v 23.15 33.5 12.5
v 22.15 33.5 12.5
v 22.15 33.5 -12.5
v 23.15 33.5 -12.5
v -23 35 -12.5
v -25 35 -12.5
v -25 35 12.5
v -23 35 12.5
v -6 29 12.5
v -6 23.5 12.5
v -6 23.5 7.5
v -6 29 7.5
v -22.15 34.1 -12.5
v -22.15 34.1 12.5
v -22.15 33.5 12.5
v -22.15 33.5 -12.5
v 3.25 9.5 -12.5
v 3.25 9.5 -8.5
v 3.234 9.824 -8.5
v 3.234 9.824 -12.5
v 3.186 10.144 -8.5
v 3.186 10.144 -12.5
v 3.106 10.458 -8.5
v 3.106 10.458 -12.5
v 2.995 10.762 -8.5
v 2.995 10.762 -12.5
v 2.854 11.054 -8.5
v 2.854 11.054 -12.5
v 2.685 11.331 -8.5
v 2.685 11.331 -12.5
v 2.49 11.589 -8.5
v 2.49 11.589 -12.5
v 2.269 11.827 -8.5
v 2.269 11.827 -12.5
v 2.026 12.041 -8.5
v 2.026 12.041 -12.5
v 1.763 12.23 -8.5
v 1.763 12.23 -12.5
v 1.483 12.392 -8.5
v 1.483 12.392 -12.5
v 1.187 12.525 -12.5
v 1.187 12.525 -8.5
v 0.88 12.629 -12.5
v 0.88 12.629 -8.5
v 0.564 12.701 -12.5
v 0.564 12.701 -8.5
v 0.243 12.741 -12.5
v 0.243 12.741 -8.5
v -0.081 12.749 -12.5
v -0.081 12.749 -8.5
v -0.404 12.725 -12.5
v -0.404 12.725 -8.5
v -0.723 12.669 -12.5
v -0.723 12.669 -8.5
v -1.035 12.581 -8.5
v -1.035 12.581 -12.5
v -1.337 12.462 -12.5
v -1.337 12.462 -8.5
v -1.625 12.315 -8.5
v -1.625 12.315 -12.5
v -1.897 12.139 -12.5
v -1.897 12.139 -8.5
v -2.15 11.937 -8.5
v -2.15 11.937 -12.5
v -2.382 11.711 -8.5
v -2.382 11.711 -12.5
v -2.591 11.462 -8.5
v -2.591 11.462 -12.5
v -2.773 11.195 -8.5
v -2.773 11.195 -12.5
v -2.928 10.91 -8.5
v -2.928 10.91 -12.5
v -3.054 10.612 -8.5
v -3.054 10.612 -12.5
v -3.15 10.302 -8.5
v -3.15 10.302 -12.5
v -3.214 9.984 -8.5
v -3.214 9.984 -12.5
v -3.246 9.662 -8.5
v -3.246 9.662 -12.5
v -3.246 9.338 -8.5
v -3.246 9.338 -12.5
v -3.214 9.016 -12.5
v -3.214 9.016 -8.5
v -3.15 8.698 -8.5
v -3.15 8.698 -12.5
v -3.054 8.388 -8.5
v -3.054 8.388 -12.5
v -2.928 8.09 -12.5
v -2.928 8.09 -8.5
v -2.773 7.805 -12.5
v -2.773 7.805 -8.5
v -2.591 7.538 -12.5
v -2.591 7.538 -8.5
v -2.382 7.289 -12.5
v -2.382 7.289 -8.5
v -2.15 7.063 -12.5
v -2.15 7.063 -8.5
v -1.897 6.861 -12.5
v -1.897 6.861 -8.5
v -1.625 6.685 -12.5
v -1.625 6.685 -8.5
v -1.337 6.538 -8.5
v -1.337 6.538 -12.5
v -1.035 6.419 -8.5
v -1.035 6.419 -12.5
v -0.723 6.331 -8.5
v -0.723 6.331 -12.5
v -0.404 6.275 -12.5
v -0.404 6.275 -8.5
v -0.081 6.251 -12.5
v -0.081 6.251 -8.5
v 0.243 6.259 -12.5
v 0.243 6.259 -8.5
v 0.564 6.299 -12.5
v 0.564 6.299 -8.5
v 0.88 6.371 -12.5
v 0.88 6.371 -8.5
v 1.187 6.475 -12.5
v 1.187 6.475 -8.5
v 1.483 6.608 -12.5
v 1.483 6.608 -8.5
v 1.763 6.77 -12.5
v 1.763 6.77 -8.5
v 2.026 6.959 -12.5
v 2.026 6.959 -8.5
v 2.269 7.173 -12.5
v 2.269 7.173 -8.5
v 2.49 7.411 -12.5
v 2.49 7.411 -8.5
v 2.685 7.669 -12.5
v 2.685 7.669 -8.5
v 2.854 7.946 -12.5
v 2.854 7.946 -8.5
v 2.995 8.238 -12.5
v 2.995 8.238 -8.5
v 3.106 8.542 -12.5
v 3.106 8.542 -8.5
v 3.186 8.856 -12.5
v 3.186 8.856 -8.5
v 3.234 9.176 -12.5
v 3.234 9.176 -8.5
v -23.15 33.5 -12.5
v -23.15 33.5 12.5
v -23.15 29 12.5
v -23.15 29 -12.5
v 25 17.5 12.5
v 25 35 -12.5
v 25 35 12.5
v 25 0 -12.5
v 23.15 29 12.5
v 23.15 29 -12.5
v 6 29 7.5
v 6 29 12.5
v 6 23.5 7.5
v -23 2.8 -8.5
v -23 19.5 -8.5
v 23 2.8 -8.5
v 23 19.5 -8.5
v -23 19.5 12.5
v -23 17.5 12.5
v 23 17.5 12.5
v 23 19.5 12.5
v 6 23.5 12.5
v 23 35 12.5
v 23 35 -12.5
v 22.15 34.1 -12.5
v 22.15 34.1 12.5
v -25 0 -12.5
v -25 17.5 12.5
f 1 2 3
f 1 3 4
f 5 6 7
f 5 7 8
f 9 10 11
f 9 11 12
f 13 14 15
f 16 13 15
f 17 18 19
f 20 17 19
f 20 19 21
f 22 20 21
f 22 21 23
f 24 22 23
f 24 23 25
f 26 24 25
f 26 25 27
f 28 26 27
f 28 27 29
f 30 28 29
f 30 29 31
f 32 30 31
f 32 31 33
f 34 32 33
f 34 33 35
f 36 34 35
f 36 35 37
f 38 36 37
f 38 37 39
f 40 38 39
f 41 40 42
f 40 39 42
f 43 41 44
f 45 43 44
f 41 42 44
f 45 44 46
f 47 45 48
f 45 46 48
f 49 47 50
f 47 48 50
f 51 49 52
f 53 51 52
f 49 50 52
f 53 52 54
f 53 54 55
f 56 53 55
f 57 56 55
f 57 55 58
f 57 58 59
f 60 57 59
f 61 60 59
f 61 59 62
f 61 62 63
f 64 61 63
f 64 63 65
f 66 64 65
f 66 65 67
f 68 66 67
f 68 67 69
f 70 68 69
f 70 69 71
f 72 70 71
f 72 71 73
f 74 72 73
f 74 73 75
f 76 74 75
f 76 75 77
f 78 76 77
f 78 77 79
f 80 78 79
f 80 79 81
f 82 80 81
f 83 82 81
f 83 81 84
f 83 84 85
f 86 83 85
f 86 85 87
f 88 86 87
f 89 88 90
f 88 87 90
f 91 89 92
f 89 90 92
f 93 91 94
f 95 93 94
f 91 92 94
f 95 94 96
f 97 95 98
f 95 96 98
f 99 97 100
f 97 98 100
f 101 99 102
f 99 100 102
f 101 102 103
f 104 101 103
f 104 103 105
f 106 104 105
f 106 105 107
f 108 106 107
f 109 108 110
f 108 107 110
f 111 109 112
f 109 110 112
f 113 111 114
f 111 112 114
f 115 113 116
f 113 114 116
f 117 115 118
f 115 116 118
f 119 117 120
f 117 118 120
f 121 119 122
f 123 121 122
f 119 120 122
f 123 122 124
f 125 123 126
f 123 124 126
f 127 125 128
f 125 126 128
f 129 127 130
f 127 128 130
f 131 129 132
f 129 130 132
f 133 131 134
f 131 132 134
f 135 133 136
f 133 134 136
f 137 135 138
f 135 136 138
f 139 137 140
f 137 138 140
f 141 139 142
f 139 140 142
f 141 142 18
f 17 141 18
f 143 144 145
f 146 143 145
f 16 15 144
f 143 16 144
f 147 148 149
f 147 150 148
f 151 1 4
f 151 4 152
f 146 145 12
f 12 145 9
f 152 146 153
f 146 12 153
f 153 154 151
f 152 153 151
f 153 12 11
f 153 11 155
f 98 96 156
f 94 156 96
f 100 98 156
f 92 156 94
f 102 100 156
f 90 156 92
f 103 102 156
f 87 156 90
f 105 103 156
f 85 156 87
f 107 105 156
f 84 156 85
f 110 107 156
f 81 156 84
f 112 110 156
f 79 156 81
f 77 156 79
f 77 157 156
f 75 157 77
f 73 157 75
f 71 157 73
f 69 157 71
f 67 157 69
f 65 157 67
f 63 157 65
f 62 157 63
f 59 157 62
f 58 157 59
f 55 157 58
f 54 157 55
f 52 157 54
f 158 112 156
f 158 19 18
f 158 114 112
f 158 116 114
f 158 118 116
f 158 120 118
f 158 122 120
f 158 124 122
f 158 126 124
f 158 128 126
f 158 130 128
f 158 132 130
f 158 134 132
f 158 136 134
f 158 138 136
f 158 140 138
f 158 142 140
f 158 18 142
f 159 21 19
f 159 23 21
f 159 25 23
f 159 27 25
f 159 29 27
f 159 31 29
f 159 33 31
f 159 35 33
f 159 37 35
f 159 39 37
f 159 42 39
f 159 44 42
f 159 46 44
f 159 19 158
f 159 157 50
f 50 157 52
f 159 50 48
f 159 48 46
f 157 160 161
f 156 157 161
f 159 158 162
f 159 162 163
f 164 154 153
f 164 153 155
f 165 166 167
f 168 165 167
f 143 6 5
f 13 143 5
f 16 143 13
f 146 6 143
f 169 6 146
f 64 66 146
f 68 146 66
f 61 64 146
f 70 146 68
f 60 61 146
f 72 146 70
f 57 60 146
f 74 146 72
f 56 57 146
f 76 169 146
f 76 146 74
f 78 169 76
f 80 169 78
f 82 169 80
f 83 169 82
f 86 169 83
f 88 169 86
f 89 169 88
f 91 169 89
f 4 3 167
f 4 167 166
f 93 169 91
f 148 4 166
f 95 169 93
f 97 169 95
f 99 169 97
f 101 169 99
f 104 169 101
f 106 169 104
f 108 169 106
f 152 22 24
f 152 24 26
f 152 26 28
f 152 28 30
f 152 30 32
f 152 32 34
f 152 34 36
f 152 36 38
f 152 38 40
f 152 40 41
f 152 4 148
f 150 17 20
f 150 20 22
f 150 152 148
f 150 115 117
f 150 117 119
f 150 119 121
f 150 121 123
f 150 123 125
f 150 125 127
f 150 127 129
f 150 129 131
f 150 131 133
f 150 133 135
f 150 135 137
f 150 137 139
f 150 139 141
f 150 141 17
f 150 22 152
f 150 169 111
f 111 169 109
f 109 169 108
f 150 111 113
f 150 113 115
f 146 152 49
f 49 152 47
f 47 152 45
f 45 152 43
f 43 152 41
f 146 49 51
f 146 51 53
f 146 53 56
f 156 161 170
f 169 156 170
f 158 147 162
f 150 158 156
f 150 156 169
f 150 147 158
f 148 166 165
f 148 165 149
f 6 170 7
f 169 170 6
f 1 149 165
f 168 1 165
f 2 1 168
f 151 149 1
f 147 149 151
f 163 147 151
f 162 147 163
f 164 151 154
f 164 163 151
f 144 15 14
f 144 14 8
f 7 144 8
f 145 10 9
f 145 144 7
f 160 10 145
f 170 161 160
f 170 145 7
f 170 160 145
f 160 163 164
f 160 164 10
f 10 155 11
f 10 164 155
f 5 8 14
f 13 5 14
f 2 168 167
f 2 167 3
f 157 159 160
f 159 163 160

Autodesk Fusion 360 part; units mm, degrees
sketch "Sketch1" plane through (0, 0, 0) normal (0, 1, 0) x (1, 0, 0)
  line L0 (25, -12.5) -> (-25, -12.5)
  line L1 (-25, -12.5) -> (-25, 12.5)
  line L2 (-25, 12.5) -> (25, 12.5)
  line L3 (25, 12.5) -> (25, -12.5)
  line L4 (25, -12.5) -> (-25, 12.5) construction
  line L5 (-25, -12.5) -> (25, 12.5) construction
  dimension "d1" = 25
  dimension "d2" = 50
extrude "Extrude1" add sketch "Sketch1" along normal blind 35
sketch "Sketch2" plane through (0, 0, 12.5) normal (0, 0, 1) x (1, 0, 0)
  line L0 (-25, 0) -> (25, 0)
  line L1 (25, 0) -> (25, 35)
  line L2 (25, 35) -> (-25, 35)
  line L3 (-25, 35) -> (-25, 0)
  line L4 (0, 0) -> (0, 11) construction
  line L5 (23, 35) -> (22.15, 34.1)
  line L6 (22.15, 34.1) -> (22.15, 33.5)
  line L7 (22.15, 33.5) -> (23.15, 33.5)
  line L8 (23.15, 33.5) -> (23.15, 29)
  line L9 (23.15, 29) -> (0, 29)
  line L10 (23, 35) -> (0, 35)
  line L11 (-25, 35) -> (25, 35)
  line L12 (-23.15, 33.5) -> (-23.15, 29)
  line L13 (-25, 0) -> (-25, 35)
  line L14 (-23, 35) -> (0, 35)
  line L15 (-22.15, 33.5) -> (-23.15, 33.5)
  line L16 (-22.15, 34.1) -> (-22.15, 33.5)
  line L17 (-23.15, 29) -> (0, 29)
  line L18 (-23, 35) -> (-22.15, 34.1)
  dimension "d5" = 46.3
  dimension "d6" = 1
  dimension "d7" = 1.5
  dimension "d8" = 0.6
  dimension "d9" = 2
  dimension "d10" = 4.5
extrude "Extrude2" cut sketch "Sketch2" against normal through all contours L2 L5 L6 L7 L8 L9 L10 L11 L12 L14 L15 L16 L17 L18
sketch "Sketch3" plane through (0, 0, 12.5) normal (0, 0, 1) x (1, 0, 0)
  line L0 (23, 35) -> (22.15, 34.1)
  line L1 (22.15, 34.1) -> (22.15, 33.5)
  line L2 (22.15, 33.5) -> (23.15, 33.5)
  line L3 (23.15, 33.5) -> (23.15, 29)
  line L4 (23.15, 29) -> (-23.15, 29)
  line L5 (-23.15, 29) -> (-23.15, 33.5)
  line L6 (-23.15, 33.5) -> (-22.15, 33.5)
  line L7 (-22.15, 33.5) -> (-22.15, 34.1)
  line L8 (-22.15, 34.1) -> (-23, 35)
  line L9 (-23, 35) -> (-25, 35)
  line L10 (-25, 35) -> (-25, 0)
  line L11 (-25, 0) -> (25, 0)
  line L12 (25, 0) -> (25, 35)
  line L13 (25, 35) -> (23, 35)
  line L14 (6, 23.5) -> (-6, 23.5)
  line L15 (-6, 23.5) -> (-6, 34.5)
  line L16 (-6, 34.5) -> (6, 34.5)
  line L17 (6, 34.5) -> (6, 23.5)
  line L18 (6, 23.5) -> (-6, 34.5) construction
  line L19 (-6, 23.5) -> (6, 34.5) construction
  point P0 (0, 29)
  dimension "d12" = 12
  dimension "d13" = 11
extrude "Extrude3" cut sketch "Sketch3" against normal blind 5 contours L4 L14 L15 L17
sketch "Sketch4" plane through (25, 0, 0) normal (1, 0, 0) x (0, 0, -1)
  line L0 (-12.5, 0) -> (12.5, 0)
  line L1 (12.5, 0) -> (12.5, 35)
  line L2 (12.5, 35) -> (-12.5, 35)
  line L3 (-12.5, 35) -> (-12.5, 0)
  line L4 (-12.5, 17.5) -> (12.5, 0)
  line L5 (12.5, 0) -> (-12.5, 0)
  line L6 (-12.5, 0) -> (-12.5, 17.5)
extrude "Extrude4" cut sketch "Sketch4" against normal through all contours L0 L3 L4 L5 L6
sketch "Sketch5" plane through (0, 0, 12.5) normal (0, 0, 1) x (1, 0, 0)
  line L0 (-25, 17.5) -> (25, 17.5)
  line L1 (25, 17.5) -> (25, 35)
  line L2 (25, 35) -> (23, 35)
  line L3 (23, 35) -> (22.15, 34.1)
  line L4 (22.15, 34.1) -> (22.15, 33.5)
  line L5 (22.15, 33.5) -> (23.15, 33.5)
  line L6 (23.15, 33.5) -> (23.15, 29)
  line L7 (23.15, 29) -> (6, 29)
  line L8 (6, 29) -> (6, 23.5)
  line L9 (6, 23.5) -> (-6, 23.5)
  line L10 (-6, 23.5) -> (-6, 29)
  line L11 (-6, 29) -> (-23.15, 29)
  line L12 (-23.15, 29) -> (-23.15, 33.5)
  line L13 (-23.15, 33.5) -> (-22.15, 33.5)
  line L14 (-22.15, 33.5) -> (-22.15, 34.1)
  line L15 (-22.15, 34.1) -> (-23, 35)
  line L16 (-23, 35) -> (-25, 35)
  line L17 (-25, 35) -> (-25, 17.5)
  line L18 (23, 19.5) -> (-23, 19.5)
  line L19 (-23, 19.5) -> (-23, 0)
  line L20 (-23, 0) -> (23, 0)
  line L21 (23, 0) -> (23, 19.5)
  line L22 (23, 19.5) -> (-23, 0) construction
  line L23 (-23, 19.5) -> (23, 0) construction
  line L24 (-25, 0) -> (25, 0)
  line L25 (25, 17.5) -> (25, 0)
  line L26 (-25, 0) -> (-25, 17.5)
  point P0 (0, 9.75)
  dimension "d17" = 2
  dimension "d18" = 2
  dimension "d19" = 2
extrude "Extrude5" cut sketch "Sketch5" against normal blind 21 contours L0 L18 L19 L21 | L0 L19 L20 L21 L24
sketch "Sketch6" plane through (0, 0, -8.5) normal (0, 0, 1) x (1, 0, 0)
  line L0 (-23, 2.8) -> (23, 2.8)
  line L1 (23, 2.8) -> (23, 19.5)
  line L2 (23, 19.5) -> (-23, 19.5)
  line L3 (-23, 19.5) -> (-23, 2.8)
  circle A0 centre (0, 9.5) radius 3.25
  line L4 (0, 0) -> (0, 14) construction
  dimension "d22" = 6.5
  dimension "d23" = 9.5
extrude "Extrude6" cut sketch "Sketch6" against normal through all contours A0
